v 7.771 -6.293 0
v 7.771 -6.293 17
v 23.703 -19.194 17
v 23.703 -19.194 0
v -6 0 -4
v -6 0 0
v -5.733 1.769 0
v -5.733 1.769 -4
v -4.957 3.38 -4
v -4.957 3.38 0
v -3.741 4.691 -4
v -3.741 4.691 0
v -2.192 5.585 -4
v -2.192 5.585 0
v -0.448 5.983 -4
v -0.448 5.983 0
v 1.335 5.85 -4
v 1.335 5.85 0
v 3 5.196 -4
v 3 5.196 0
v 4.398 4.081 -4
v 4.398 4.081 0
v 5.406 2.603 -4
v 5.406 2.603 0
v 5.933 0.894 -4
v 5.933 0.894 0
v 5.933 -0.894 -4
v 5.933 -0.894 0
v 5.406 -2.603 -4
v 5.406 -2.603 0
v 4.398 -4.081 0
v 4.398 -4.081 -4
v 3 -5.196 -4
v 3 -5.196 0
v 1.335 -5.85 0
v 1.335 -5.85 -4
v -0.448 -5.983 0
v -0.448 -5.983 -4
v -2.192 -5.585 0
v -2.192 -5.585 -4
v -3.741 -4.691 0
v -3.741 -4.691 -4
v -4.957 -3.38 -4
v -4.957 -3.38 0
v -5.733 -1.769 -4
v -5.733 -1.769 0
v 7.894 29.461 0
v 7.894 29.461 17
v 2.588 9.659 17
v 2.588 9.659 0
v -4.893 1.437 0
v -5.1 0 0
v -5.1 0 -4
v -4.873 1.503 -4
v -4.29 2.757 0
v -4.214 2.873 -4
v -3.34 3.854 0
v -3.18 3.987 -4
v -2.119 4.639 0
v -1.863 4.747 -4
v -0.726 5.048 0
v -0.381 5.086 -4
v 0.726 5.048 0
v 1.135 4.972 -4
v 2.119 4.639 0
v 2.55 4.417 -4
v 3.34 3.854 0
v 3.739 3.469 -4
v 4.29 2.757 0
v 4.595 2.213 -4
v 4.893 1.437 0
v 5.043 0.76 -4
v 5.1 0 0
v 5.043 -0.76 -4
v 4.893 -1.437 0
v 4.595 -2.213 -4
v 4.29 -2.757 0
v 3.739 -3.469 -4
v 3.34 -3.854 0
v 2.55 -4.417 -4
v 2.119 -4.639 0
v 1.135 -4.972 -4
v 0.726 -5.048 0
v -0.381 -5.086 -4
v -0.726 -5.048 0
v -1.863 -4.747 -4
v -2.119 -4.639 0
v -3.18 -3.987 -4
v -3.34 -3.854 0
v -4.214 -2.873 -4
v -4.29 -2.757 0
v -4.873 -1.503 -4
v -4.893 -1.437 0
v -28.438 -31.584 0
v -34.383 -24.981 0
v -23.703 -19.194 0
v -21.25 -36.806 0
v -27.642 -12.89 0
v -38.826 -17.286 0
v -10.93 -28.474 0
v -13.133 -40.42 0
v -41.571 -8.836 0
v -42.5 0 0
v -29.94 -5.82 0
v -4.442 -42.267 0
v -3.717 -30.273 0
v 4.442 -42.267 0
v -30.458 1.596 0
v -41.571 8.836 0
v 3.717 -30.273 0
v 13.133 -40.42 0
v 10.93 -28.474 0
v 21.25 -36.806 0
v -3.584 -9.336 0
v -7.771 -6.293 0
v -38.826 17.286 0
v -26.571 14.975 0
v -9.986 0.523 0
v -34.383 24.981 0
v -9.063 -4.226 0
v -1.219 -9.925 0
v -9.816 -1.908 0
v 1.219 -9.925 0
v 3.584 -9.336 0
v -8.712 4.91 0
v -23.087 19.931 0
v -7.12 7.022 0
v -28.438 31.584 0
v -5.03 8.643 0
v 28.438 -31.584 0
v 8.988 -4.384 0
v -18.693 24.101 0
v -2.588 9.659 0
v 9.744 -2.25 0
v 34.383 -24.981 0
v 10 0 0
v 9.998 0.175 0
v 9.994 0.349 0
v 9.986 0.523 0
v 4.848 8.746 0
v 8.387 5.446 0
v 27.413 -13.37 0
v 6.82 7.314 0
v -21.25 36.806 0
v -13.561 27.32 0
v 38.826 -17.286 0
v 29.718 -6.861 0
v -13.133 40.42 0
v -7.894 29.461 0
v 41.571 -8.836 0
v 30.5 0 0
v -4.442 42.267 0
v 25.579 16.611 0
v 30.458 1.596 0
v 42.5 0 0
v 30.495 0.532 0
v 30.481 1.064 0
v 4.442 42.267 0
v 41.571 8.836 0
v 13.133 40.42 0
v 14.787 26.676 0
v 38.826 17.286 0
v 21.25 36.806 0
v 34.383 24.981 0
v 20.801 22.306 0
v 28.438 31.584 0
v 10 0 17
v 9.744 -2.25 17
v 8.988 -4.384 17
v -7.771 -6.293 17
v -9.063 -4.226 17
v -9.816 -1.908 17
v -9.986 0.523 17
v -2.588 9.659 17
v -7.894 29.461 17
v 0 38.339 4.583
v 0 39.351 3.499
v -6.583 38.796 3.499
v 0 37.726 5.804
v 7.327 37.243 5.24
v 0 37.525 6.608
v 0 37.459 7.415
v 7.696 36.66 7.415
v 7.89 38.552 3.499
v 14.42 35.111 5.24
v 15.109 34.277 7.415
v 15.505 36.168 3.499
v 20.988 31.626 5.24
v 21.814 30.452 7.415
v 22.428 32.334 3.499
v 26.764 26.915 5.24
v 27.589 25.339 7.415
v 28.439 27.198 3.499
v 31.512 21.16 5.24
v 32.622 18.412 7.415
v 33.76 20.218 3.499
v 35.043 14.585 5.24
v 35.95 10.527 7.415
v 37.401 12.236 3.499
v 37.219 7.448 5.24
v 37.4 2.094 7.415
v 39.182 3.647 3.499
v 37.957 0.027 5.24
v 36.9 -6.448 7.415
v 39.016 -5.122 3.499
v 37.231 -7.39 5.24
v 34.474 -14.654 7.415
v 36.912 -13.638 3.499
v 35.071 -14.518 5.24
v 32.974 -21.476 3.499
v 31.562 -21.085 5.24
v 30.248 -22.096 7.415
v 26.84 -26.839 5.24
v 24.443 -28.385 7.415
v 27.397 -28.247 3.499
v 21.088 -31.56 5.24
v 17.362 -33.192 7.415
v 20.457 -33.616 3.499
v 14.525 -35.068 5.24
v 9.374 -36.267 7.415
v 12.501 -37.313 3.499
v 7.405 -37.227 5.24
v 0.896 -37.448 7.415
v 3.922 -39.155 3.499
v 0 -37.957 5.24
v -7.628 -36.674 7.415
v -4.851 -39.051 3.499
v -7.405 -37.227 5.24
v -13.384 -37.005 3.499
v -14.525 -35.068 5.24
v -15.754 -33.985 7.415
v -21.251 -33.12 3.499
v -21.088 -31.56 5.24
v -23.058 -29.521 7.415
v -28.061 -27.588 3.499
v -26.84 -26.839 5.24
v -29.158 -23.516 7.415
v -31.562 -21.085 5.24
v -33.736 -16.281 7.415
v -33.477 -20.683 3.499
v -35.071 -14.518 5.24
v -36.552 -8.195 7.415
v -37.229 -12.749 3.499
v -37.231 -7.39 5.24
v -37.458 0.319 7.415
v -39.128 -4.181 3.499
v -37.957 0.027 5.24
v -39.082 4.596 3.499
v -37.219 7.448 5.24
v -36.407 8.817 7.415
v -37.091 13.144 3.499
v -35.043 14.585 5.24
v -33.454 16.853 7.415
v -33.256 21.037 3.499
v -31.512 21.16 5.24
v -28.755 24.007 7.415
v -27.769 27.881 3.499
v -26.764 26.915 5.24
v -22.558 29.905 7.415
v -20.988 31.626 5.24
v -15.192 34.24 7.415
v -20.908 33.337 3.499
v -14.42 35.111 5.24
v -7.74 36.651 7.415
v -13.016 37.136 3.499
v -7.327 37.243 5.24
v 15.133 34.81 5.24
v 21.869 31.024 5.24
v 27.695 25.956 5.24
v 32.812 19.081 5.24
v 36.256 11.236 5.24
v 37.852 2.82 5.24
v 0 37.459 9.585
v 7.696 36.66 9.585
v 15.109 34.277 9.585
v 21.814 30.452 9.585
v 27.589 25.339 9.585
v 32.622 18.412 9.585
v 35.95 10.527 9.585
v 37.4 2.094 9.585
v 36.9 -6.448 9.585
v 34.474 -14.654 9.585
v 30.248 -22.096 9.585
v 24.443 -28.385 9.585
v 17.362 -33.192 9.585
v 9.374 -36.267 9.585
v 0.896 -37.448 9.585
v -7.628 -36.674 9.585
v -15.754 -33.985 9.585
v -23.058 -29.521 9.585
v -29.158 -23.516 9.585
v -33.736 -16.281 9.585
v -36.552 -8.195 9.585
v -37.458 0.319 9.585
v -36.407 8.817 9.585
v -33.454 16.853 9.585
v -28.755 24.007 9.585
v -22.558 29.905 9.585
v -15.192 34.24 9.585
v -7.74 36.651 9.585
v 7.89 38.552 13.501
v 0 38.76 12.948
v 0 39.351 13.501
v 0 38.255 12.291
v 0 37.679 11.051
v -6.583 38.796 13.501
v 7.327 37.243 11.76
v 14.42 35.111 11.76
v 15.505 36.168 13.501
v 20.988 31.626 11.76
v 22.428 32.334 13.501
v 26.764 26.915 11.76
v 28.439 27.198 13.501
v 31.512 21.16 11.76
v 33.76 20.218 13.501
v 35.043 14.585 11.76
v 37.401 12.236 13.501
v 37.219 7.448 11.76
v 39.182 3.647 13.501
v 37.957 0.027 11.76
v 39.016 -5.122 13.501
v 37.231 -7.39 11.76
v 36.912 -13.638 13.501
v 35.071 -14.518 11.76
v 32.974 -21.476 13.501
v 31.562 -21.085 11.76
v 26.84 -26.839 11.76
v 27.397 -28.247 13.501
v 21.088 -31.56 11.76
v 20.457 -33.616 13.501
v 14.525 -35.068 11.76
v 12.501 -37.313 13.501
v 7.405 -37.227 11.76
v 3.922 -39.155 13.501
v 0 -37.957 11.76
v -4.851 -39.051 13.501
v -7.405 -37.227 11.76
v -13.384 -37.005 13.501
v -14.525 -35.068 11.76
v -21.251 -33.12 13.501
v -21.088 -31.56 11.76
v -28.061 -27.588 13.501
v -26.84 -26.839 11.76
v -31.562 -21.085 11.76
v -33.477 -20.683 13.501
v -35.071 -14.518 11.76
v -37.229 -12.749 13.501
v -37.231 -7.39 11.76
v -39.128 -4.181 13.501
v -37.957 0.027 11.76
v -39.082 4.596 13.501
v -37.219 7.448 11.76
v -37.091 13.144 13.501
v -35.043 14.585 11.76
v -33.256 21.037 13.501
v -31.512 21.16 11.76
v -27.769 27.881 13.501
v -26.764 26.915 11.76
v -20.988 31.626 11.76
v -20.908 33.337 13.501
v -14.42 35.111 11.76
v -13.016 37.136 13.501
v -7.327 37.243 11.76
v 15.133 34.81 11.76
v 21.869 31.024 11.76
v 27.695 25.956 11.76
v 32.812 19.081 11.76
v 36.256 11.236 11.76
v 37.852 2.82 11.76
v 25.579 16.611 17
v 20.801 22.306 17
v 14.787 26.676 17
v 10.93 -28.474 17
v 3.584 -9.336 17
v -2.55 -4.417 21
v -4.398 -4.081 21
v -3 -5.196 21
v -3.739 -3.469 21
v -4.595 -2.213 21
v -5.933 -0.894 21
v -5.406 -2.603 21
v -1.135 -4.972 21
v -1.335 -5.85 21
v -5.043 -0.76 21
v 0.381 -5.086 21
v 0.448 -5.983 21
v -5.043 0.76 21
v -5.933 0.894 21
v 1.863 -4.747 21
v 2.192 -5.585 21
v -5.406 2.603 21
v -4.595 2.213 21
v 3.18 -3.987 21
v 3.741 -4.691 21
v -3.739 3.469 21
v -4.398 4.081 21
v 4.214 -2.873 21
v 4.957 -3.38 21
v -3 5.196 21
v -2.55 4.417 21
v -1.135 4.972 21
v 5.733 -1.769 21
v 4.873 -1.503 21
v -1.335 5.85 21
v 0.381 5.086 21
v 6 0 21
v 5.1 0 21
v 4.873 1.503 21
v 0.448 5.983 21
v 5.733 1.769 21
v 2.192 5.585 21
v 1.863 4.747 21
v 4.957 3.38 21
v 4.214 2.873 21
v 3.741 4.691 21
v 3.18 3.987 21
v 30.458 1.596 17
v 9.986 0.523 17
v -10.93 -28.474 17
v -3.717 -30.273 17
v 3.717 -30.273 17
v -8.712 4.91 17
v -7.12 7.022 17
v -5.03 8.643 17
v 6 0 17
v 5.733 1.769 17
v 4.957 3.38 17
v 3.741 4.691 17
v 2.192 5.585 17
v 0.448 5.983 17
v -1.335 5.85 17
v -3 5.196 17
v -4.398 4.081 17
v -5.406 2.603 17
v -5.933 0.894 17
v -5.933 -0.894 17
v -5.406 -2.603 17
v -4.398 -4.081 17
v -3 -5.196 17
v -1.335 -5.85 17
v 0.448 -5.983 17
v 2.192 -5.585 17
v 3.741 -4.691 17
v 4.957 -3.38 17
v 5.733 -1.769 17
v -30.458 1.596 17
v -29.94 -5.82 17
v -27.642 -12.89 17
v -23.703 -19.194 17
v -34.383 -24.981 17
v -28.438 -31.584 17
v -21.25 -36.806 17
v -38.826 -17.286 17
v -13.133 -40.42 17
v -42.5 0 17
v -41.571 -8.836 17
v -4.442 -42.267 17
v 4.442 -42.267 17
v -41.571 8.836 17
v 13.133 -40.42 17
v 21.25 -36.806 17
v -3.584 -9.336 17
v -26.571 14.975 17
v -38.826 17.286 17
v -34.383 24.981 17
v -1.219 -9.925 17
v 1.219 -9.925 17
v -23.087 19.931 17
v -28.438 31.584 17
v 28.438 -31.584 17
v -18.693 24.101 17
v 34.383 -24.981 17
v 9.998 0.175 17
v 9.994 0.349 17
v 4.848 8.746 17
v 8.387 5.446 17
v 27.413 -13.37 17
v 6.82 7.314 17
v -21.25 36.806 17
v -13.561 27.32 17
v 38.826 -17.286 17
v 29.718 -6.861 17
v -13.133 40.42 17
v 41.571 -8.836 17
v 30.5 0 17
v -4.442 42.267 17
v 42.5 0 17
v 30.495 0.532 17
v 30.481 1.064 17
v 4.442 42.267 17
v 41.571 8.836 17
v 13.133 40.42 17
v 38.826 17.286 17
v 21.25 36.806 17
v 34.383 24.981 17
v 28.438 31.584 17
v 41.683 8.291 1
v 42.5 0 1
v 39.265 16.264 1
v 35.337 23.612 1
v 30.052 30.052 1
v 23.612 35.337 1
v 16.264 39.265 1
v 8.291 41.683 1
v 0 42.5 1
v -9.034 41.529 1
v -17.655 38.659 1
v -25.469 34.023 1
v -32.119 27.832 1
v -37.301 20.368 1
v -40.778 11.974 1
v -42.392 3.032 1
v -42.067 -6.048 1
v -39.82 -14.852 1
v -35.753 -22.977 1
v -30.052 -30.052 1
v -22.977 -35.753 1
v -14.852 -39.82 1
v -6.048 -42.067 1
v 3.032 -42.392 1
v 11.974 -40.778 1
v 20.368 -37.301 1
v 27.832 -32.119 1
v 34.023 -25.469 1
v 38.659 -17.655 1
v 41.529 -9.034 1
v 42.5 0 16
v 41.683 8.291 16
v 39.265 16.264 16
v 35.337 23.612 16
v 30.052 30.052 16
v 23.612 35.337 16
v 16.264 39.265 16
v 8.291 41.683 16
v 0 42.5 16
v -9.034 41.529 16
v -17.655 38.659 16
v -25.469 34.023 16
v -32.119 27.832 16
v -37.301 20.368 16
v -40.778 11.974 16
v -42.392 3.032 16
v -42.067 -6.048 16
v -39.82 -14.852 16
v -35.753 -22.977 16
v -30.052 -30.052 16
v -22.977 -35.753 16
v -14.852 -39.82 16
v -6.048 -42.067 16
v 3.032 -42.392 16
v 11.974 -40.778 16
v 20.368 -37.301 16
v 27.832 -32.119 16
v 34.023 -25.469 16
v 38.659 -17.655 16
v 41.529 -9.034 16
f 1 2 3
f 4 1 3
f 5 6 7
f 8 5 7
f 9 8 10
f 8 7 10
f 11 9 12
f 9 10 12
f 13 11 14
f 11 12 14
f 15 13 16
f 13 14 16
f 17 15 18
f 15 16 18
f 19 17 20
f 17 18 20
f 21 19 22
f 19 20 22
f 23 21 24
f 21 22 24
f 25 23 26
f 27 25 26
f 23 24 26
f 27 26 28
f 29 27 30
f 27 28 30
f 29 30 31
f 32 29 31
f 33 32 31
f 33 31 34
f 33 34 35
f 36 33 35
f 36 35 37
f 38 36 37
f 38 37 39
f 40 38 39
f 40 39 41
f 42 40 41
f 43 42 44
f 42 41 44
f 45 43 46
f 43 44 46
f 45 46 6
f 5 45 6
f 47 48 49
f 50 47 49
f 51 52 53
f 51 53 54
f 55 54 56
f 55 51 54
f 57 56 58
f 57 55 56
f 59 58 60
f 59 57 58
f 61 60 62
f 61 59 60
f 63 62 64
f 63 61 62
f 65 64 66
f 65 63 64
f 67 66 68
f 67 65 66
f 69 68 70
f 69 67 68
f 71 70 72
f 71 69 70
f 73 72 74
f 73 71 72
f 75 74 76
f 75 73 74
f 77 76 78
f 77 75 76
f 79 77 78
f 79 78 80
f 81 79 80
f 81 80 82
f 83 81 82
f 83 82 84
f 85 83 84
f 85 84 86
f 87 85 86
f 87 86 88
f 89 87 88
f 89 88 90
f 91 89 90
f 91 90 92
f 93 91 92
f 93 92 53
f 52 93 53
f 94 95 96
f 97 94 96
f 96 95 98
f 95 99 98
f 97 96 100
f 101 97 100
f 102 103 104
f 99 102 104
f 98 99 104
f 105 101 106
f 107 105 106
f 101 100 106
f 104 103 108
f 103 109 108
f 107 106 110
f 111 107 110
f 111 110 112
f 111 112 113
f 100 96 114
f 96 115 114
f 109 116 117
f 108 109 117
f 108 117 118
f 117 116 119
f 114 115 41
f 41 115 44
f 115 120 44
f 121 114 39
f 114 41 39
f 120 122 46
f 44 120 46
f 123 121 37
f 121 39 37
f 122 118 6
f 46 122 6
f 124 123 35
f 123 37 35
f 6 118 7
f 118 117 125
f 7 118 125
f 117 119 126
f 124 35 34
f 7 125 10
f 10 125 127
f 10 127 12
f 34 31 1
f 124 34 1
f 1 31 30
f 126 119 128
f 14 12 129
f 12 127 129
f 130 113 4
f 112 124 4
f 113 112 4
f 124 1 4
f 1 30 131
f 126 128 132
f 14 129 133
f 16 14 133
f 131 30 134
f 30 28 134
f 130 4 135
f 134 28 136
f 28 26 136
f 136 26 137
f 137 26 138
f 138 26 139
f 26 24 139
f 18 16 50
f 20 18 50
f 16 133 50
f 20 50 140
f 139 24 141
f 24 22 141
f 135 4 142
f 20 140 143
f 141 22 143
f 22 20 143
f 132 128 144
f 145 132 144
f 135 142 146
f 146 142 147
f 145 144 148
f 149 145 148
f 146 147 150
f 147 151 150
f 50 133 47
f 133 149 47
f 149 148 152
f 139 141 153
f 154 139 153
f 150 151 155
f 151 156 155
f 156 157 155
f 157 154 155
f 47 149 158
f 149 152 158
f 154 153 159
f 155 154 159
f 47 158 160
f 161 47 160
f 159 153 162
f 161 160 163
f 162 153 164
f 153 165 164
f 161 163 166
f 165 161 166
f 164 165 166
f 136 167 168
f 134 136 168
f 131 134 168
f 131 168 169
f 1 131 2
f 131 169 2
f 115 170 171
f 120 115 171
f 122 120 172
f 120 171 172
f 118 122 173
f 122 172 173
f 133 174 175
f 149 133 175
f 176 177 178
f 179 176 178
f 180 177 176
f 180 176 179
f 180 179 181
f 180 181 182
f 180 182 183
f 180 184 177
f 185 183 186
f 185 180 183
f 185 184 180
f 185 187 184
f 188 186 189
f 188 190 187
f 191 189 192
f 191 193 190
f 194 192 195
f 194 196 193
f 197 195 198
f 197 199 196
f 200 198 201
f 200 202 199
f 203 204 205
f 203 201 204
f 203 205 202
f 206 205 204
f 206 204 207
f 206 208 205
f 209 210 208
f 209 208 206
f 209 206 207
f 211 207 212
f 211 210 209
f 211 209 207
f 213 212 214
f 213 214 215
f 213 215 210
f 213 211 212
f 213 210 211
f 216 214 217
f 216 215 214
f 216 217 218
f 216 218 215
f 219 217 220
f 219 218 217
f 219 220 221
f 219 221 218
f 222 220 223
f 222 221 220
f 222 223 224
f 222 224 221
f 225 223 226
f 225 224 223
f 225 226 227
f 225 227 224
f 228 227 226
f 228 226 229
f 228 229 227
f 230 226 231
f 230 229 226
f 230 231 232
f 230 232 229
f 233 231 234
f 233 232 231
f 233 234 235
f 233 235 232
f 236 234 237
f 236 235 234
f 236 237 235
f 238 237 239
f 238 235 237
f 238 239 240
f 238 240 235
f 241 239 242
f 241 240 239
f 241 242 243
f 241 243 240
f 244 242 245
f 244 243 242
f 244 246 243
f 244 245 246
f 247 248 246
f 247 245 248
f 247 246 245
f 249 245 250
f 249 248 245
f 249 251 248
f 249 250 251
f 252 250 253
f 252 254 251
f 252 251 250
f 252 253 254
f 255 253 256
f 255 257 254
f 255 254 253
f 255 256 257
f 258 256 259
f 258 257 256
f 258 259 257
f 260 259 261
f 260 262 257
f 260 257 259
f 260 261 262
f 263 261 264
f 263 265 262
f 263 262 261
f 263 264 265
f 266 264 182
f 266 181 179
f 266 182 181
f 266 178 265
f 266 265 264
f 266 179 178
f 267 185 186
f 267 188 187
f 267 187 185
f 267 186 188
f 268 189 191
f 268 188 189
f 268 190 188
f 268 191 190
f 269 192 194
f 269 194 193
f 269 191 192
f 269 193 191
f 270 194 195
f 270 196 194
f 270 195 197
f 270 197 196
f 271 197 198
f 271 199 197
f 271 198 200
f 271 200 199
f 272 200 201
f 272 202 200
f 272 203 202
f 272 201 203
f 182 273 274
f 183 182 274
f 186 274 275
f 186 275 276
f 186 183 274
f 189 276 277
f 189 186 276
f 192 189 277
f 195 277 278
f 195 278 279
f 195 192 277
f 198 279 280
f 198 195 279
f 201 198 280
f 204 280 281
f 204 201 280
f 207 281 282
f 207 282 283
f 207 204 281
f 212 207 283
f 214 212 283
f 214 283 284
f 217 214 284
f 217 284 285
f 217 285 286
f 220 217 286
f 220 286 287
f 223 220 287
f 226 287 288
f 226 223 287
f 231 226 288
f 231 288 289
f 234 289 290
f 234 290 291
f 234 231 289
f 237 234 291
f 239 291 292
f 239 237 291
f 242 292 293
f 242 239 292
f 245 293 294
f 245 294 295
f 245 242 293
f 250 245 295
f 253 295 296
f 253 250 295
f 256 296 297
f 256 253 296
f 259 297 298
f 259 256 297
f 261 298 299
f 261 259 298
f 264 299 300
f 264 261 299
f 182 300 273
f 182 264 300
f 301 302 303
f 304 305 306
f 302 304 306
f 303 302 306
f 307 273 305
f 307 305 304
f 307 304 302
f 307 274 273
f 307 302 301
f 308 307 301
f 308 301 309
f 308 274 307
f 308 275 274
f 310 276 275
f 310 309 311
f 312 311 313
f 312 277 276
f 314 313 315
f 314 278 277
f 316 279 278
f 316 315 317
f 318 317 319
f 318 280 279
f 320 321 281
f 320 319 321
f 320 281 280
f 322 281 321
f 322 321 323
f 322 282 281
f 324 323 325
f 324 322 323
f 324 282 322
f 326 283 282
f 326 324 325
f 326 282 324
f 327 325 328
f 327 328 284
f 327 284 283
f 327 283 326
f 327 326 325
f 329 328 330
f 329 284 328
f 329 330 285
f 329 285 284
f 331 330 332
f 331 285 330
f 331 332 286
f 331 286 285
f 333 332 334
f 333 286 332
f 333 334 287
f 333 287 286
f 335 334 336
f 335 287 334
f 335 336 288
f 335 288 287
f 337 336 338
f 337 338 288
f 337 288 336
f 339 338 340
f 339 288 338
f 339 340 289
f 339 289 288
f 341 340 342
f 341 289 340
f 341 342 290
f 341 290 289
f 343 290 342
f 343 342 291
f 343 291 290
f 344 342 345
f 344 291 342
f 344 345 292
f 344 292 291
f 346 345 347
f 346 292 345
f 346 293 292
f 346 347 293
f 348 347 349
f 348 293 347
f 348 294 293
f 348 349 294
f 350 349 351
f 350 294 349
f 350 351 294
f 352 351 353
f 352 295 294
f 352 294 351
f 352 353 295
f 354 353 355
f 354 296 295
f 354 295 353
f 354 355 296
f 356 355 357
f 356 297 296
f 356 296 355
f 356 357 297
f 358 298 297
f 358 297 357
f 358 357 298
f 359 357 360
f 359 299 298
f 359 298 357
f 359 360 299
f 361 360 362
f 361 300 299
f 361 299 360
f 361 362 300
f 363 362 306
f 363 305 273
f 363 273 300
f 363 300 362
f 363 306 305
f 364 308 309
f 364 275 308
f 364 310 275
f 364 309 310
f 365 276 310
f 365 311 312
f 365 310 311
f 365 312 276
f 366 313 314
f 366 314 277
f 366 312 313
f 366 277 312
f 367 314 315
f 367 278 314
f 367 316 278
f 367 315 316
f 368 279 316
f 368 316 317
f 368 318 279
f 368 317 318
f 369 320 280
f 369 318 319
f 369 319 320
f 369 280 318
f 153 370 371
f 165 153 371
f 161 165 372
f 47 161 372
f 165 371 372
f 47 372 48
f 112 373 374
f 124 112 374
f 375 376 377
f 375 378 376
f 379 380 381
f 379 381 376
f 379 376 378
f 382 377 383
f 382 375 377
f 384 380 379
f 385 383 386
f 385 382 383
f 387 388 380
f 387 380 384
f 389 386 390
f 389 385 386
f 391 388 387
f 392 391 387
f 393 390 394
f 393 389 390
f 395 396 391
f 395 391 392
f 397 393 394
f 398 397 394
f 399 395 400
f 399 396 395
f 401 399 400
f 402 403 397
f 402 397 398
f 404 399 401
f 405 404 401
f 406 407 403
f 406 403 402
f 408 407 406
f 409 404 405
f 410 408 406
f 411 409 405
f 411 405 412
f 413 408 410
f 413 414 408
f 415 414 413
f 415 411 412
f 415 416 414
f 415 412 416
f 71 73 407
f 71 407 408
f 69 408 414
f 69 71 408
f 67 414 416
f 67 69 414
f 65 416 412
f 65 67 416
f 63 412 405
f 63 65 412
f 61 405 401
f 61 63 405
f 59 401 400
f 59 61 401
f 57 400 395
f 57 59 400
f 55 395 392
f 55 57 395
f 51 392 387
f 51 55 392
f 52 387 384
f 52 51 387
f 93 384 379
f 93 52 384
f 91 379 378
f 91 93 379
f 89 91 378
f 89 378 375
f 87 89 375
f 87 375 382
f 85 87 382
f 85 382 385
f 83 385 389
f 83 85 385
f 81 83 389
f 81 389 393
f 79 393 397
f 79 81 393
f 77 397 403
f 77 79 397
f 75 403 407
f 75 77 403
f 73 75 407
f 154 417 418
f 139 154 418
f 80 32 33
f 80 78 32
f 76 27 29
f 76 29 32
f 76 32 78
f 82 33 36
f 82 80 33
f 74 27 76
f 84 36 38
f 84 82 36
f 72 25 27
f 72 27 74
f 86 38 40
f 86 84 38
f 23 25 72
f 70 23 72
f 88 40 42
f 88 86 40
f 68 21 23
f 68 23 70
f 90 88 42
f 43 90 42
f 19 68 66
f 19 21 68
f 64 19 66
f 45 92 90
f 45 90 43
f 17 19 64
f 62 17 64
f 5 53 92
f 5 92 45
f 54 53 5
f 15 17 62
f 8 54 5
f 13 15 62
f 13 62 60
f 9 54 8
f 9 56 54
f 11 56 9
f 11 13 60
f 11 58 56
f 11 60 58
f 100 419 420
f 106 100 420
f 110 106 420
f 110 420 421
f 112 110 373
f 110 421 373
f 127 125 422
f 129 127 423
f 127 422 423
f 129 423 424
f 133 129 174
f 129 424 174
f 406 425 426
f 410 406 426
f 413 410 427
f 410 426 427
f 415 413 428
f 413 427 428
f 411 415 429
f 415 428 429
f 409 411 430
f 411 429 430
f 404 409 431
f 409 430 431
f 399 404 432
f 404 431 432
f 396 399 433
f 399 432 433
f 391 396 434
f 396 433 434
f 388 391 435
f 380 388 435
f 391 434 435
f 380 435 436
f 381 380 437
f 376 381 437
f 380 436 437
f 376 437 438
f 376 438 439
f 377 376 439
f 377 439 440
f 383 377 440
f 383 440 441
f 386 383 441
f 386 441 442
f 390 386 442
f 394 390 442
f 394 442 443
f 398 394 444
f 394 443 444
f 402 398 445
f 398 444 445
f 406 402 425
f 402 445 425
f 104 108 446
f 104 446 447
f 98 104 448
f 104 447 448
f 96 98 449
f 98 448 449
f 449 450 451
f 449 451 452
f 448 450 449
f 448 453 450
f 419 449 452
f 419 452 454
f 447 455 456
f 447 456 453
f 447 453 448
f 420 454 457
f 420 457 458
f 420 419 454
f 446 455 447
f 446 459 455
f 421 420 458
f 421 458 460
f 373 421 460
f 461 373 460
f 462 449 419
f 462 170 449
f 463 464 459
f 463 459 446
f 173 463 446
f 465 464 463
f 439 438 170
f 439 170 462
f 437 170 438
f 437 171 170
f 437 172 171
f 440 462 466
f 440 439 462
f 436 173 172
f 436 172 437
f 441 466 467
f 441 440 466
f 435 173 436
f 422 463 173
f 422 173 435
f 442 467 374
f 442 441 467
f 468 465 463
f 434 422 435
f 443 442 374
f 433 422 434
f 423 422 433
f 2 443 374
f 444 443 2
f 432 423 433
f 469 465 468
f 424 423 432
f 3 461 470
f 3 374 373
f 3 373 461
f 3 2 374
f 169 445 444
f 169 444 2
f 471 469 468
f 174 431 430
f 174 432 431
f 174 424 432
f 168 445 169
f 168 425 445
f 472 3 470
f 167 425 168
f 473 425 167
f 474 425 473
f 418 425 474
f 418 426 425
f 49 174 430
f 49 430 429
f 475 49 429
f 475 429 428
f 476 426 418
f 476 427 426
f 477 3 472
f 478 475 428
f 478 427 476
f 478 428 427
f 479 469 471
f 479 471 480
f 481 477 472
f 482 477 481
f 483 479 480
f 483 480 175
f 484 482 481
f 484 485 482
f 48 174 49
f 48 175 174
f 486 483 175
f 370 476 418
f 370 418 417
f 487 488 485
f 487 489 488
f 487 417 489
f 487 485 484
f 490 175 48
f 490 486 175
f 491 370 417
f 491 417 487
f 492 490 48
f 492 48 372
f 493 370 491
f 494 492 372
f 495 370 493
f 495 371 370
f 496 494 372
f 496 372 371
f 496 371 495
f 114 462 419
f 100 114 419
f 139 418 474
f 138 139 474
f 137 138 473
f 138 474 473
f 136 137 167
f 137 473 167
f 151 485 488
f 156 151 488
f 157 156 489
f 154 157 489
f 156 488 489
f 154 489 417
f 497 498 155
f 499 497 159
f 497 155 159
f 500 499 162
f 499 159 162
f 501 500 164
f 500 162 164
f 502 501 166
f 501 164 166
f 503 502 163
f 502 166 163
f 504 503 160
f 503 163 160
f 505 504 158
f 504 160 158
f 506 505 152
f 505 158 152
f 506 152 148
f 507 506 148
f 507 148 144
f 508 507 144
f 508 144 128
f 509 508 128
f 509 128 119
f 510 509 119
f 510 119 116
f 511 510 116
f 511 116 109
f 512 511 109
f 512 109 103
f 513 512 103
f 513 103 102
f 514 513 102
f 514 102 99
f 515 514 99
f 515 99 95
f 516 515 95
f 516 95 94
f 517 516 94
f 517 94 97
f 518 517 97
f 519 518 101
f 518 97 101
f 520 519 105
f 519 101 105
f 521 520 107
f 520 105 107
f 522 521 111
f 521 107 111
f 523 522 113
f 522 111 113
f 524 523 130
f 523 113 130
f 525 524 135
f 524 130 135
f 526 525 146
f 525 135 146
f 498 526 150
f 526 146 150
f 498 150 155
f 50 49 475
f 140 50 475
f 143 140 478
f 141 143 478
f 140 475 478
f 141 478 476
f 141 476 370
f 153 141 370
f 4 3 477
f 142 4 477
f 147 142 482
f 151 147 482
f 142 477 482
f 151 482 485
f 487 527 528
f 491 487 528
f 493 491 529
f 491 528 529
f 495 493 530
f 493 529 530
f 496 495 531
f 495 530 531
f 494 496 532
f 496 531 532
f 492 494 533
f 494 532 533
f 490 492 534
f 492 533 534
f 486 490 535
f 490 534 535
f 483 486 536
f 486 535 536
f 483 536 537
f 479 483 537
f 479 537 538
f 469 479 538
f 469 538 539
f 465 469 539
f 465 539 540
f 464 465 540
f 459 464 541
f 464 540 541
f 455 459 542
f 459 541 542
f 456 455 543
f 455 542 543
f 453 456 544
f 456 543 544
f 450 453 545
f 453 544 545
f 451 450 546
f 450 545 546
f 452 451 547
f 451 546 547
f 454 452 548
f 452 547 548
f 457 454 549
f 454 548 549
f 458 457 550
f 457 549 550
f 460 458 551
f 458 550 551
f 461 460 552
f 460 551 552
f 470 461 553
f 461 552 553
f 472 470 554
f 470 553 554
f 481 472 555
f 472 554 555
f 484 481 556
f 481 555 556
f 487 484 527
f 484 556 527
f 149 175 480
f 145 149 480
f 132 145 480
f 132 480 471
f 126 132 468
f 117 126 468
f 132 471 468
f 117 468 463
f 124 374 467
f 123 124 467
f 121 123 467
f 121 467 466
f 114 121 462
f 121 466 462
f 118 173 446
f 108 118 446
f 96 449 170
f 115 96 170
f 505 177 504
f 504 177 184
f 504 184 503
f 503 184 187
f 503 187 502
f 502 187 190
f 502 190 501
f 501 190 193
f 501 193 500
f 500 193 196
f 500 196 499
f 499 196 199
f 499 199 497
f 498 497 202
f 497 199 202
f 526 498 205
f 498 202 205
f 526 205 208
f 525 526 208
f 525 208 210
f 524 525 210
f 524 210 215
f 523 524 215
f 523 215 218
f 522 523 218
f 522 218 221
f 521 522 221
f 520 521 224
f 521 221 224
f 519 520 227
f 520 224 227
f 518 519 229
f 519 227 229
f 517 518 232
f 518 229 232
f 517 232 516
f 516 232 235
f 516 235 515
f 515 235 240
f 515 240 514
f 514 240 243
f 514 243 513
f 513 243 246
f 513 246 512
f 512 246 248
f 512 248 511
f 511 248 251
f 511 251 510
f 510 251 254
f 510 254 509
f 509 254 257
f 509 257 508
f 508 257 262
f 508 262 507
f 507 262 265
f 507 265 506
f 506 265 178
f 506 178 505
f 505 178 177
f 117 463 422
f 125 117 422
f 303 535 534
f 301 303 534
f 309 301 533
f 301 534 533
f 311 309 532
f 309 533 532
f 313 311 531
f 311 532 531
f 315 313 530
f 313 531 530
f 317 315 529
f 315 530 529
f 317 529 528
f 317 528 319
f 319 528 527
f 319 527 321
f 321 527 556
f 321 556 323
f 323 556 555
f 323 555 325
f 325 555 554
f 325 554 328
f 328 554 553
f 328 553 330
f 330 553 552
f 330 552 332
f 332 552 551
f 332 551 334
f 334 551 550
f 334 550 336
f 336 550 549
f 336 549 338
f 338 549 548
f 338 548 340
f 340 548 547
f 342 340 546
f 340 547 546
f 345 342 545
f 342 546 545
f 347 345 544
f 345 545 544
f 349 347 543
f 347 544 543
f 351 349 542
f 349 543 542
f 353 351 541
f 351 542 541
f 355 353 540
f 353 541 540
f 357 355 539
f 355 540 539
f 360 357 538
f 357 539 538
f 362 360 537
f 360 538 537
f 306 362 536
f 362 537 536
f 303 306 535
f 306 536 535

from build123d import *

# Parameters (mm, degrees)
SKETCH1_R           = 42.5
BOSS_EXTRUDE1_DEPTH = 17
CUT_EXTRUDE3_DEPTH  = 17
SKETCH4_R           = 5.1
CUT_EXTRUDE4_DEPTH  = 17
SKETCH5_R           = 6
SKETCH5_R_2         = 5.1
BOSS_EXTRUDE2_DEPTH = 4
SKETCH6_R           = 6
SKETCH6_R_2         = 5.1
BOSS_EXTRUDE3_DEPTH = 4
FILLET1_R           = 5
FILLET2_R           = 5


with BuildPart() as part:
    # Sketch1 → Boss-Extrude1 (new body)
    with BuildSketch(Plane.XY):
        Circle(SKETCH1_R)
    extrude(amount=BOSS_EXTRUDE1_DEPTH)

    # Sketch3 → Cut-Extrude3 (cut)
    with BuildSketch(Plane.XY.offset(17)):
        with BuildLine():
            ThreePointArc((-8.711670849, 4.9098667), (-6.128694511, 7.901841785), (-2.588190451, 9.659258263))
            Line((-2.588190451, 9.659258263), (-7.893980876, 29.460737702))
            ThreePointArc((-7.893980876, 29.460737702), (-18.692518258, 24.100617444), (-26.570596091, 14.975093435))
            Line((-26.570596091, 14.975093435), (-8.711670849, 4.9098667))
        make_face()
        with BuildLine():
            Line((7.893980876, 29.460737702), (2.588190451, 9.659258263))
            ThreePointArc((2.588190451, 9.659258263), (5.877852523, 8.090169944), (8.386705679, 5.44639035))
            Line((8.386705679, 5.44639035), (25.579452322, 16.611490568))
            ThreePointArc((25.579452322, 16.611490568), (17.927450195, 24.675018328), (7.893980876, 29.460737702))
        make_face()
        with BuildLine():
            Line((30.45820081, 1.596246665), (9.986295348, 0.523359562))
            ThreePointArc((9.986295348, 0.523359562), (9.99657325, 0.261769483), (10, 0))
            ThreePointArc((10, 0), (9.426414911, -3.338068592), (7.771459615, -6.29320391))
            Line((7.771459615, -6.29320391), (23.702951824, -19.194271927))
            ThreePointArc((23.702951824, -19.194271927), (28.750565478, -10.181109207), (30.5, 0))
            ThreePointArc((30.5, 0), (30.489548412, 0.798396923), (30.45820081, 1.596246665))
        make_face()
        with BuildLine():
            Line((10.930222461, -28.474203008), (3.583679495, -9.335804265))
            ThreePointArc((3.583679495, -9.335804265), (0, -10), (-3.583679495, -9.335804265))
            Line((-3.583679495, -9.335804265), (-10.930222461, -28.474203008))
            ThreePointArc((-10.930222461, -28.474203008), (0, -30.5), (10.930222461, -28.474203008))
        make_face()
        with BuildLine():
            Line((-23.702951824, -19.194271927), (-7.771459615, -6.29320391))
            ThreePointArc((-7.771459615, -6.29320391), (-9.510565163, -3.090169944), (-9.986295348, 0.523359562))
            Line((-9.986295348, 0.523359562), (-30.45820081, 1.596246665))
            ThreePointArc((-30.45820081, 1.596246665), (-29.007223747, -9.425018328), (-23.702951824, -19.194271927))
        make_face()
    extrude(amount=-CUT_EXTRUDE3_DEPTH, mode=Mode.SUBTRACT)

    # Sketch4 → Cut-Extrude4 (cut)
    with BuildSketch(Plane.XY.offset(17)):
        Circle(SKETCH4_R)
    extrude(amount=-CUT_EXTRUDE4_DEPTH, mode=Mode.SUBTRACT)

    # Sketch5 → Boss-Extrude2 (add)
    with BuildSketch(Plane.XY.offset(17)):
        Circle(SKETCH5_R)
        Circle(SKETCH5_R_2, mode=Mode.SUBTRACT)
    extrude(amount=BOSS_EXTRUDE2_DEPTH)

    # Sketch6 → Boss-Extrude3 (add)
    with BuildSketch(Plane(origin=(0, 0, 0), x_dir=(-1, 0, 0), z_dir=(0, 0, -1))):
        Circle(SKETCH6_R)
        Circle(SKETCH6_R_2, mode=Mode.SUBTRACT)
    extrude(amount=BOSS_EXTRUDE3_DEPTH)

    # Sketch10 → Cut-Revolve1 (revolve, cut)
    with BuildSketch(Plane(origin=(0, 0, 0), x_dir=(0, 0, -1), z_dir=(1, 0, 0))):
        Polygon((-16, 42.5), (-8.5, 42.5), (-8.5, 37.459040498), (-12, 37.459040498), align=None)
        Polygon((-8.5, 42.5), (-1, 42.5), (-5, 37.459040498), (-8.5, 37.459040498), align=None)
    revolve(axis=Axis((0, 0, 0), (0, 0, -1)), mode=Mode.SUBTRACT)

    # Fillet1
    fillet1_edges = [part.edges().sort_by_distance(p)[0] for p in [
        (0, -37.459040498, 5),
    ]]
    fillet(fillet1_edges, radius=FILLET1_R)

    # Fillet2
    fillet2_edges = [part.edges().sort_by_distance(p)[0] for p in [
        (0, -37.459040498, 12),
    ]]
    fillet(fillet2_edges, radius=FILLET2_R)


solid = part.part
